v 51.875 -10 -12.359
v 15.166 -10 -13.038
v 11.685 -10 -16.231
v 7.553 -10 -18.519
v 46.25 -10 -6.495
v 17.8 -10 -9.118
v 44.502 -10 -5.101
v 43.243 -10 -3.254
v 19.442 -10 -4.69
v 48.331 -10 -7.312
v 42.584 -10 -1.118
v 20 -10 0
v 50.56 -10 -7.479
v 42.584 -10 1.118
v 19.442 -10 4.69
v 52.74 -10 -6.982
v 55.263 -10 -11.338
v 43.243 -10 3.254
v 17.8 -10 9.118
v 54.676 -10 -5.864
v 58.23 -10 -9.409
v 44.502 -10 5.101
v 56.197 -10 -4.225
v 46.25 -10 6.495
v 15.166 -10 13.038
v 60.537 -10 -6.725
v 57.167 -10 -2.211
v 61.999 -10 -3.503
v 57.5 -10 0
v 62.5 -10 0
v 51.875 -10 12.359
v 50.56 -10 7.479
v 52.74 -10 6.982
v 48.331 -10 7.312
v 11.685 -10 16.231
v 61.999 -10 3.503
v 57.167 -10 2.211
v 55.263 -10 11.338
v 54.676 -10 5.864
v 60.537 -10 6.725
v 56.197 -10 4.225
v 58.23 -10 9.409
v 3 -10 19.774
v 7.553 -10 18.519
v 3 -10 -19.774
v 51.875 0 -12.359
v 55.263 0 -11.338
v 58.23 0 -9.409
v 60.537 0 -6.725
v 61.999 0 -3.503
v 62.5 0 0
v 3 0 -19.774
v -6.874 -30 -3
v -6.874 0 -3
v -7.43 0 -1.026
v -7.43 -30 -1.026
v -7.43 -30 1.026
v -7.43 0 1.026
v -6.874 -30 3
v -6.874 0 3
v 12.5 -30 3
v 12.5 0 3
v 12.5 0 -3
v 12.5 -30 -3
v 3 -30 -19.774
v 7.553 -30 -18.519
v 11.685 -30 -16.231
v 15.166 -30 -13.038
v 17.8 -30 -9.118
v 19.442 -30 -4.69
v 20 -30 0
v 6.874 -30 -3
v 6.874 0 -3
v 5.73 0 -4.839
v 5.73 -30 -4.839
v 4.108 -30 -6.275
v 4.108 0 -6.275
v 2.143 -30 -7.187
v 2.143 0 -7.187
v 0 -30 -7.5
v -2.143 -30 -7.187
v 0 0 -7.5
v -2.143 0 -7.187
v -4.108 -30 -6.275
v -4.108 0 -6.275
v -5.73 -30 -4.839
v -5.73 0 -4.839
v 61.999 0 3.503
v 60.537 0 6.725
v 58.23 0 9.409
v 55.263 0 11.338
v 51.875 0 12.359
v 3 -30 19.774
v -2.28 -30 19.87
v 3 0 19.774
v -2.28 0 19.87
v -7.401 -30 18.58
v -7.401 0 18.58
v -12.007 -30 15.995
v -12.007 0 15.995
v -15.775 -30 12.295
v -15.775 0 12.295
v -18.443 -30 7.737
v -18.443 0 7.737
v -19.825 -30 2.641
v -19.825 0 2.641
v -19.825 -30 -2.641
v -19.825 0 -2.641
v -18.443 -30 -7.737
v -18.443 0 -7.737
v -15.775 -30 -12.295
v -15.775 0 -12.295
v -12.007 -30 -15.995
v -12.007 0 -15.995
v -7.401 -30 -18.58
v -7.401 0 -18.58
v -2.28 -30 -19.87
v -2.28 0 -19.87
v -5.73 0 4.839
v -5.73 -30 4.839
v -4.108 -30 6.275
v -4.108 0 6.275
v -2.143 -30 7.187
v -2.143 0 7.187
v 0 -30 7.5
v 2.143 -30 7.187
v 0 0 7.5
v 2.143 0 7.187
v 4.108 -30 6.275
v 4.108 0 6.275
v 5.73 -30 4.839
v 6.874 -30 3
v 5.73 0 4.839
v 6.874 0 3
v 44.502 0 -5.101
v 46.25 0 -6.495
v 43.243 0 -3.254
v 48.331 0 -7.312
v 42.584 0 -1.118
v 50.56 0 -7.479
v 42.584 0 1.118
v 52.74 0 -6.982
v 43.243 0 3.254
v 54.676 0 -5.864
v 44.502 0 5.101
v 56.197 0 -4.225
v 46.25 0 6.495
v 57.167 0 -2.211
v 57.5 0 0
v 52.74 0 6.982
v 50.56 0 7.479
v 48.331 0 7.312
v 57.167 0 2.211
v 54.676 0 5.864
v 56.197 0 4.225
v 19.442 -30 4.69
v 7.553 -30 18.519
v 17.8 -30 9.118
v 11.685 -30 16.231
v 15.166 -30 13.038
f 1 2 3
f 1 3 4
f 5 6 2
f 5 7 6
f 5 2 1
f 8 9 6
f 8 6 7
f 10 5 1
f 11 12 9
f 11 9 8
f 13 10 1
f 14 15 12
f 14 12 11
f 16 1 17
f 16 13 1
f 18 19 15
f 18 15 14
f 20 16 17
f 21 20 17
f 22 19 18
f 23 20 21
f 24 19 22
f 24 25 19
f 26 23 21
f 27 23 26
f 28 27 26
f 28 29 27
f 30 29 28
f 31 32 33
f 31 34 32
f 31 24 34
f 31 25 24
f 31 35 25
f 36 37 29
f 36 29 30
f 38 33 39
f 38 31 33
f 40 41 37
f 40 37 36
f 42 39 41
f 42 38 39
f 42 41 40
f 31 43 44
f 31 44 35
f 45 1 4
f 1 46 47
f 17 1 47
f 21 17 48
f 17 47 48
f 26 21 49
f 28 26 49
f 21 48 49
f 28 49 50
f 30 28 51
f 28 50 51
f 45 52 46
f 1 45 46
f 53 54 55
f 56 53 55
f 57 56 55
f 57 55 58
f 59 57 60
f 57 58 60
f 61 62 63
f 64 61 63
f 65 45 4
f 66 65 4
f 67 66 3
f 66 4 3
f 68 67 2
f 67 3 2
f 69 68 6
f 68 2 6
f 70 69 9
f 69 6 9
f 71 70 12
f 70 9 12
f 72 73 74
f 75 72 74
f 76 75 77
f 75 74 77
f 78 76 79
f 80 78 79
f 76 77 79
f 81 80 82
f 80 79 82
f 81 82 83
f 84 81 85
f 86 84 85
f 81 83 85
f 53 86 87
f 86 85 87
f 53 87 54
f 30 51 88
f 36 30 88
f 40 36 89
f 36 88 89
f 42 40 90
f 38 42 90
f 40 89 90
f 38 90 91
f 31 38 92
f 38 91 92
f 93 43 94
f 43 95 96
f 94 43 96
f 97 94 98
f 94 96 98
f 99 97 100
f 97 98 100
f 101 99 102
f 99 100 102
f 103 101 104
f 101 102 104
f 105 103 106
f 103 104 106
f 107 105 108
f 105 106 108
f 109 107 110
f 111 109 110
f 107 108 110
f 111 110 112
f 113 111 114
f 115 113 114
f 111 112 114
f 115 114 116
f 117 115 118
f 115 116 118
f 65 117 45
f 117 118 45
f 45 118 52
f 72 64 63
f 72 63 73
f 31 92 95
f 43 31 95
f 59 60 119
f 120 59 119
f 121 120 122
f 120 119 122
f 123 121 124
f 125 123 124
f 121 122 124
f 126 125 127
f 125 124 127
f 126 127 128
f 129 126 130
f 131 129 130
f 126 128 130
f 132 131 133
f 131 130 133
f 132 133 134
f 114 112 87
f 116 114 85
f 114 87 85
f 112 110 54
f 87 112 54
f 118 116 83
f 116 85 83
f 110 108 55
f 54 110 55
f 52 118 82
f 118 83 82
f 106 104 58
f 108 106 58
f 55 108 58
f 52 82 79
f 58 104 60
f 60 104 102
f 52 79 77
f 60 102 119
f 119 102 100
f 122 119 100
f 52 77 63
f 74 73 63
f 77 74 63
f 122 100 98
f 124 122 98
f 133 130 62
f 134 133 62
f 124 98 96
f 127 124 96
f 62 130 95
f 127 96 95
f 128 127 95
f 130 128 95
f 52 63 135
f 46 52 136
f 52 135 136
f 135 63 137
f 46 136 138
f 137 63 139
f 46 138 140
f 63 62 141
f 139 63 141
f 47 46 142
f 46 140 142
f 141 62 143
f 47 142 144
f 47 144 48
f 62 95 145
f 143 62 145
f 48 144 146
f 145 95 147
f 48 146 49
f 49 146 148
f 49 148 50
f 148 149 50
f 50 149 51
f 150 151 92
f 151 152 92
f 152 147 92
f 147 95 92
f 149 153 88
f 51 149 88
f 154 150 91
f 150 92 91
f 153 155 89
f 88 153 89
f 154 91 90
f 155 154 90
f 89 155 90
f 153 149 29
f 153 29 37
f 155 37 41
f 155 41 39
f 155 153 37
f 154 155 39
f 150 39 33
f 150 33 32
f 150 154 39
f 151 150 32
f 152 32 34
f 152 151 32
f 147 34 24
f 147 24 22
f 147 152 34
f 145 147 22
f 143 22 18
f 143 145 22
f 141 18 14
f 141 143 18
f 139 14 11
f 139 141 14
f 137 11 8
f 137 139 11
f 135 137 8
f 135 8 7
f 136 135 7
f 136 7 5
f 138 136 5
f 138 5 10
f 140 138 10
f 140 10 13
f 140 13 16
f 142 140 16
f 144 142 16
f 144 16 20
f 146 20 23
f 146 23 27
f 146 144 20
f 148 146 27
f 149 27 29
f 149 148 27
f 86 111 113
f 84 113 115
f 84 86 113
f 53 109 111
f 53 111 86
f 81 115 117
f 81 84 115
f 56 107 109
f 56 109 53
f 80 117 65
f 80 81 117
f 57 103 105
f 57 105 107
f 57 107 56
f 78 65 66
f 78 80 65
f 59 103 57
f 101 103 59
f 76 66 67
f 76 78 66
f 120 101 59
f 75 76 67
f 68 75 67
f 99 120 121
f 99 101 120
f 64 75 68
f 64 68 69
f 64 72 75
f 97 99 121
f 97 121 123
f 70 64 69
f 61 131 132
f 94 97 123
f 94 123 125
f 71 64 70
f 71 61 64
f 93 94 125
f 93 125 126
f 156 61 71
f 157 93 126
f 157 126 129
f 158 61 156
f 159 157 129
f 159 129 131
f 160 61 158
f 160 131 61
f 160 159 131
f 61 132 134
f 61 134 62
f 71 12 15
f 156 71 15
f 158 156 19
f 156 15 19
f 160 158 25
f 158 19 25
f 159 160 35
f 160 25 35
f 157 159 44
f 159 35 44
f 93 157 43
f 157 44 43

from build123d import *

# Parameters (mm, degrees)
F0_R     = 7.5
F1_DEPTH = 10
F2_DEPTH = 30


with BuildPart() as f1:
    # F0 (on Front) → F1 (new body)
    with BuildSketch(Plane.XZ):
        with BuildLine():
            ThreePointArc((3, -19.77372), (15.165751, -13.038405), (20, 0))
            ThreePointArc((20, 0), (15.165751, 13.038405), (3, 19.77372))
            ThreePointArc((3, 19.77372), (-20, 0), (3, -19.77372))
        make_face()
        with BuildLine():
            Line((12.5, 3), (12.5, -3))
            Line((12.5, -3), (6.873864, -3))
            ThreePointArc((6.873864, -3), (0, -7.5), (-6.873864, -3))
            Line((-6.873864, -3), (-12.5, -3))
            Line((-12.5, -3), (-12.5, 3))
            Line((-12.5, 3), (-6.873864, 3))
            ThreePointArc((-6.873864, 3), (0, 7.5), (6.873864, 3))
            Line((6.873864, 3), (12.5, 3))
        make_face(mode=Mode.SUBTRACT)
        with BuildLine():
            ThreePointArc((3, 19.77372), (15.165751, 13.038405), (20, 0))
            ThreePointArc((20, 0), (15.165751, -13.038405), (3, -19.77372))
            Line((3, -19.77372), (51.875, -12.358575))
            ThreePointArc((51.875, -12.358575), (37.5, 0), (51.875, 12.358575))
            Line((51.875, 12.358575), (3, 19.77372))
        make_face()
        with BuildLine():
            ThreePointArc((62.5, 0), (59.478594, 8.149003), (51.875, 12.358575))
            ThreePointArc((51.875, 12.358575), (37.5, 0), (51.875, -12.358575))
            ThreePointArc((51.875, -12.358575), (59.478594, -8.149003), (62.5, 0))
        make_face()
        with Locations((50, 0)):
            Circle(F0_R, mode=Mode.SUBTRACT)
        with BuildLine():
            Line((-12.5, -3), (-6.873864, -3))
            ThreePointArc((-6.873864, -3), (-7.5, 0), (-6.873864, 3))
            Line((-6.873864, 3), (-12.5, 3))
            Line((-12.5, 3), (-12.5, -3))
        make_face()
    extrude(amount=F1_DEPTH)

    # F0 (on Front) → F2 (join)
    with BuildSketch(Plane.XZ):
        with BuildLine():
            ThreePointArc((3, -19.77372), (15.165751, -13.038405), (20, 0))
            ThreePointArc((20, 0), (15.165751, 13.038405), (3, 19.77372))
            ThreePointArc((3, 19.77372), (-20, 0), (3, -19.77372))
        make_face()
        with BuildLine():
            Line((12.5, 3), (12.5, -3))
            Line((12.5, -3), (6.873864, -3))
            ThreePointArc((6.873864, -3), (0, -7.5), (-6.873864, -3))
            Line((-6.873864, -3), (-12.5, -3))
            Line((-12.5, -3), (-12.5, 3))
            Line((-12.5, 3), (-6.873864, 3))
            ThreePointArc((-6.873864, 3), (0, 7.5), (6.873864, 3))
            Line((6.873864, 3), (12.5, 3))
        make_face(mode=Mode.SUBTRACT)
        with BuildLine():
            Line((-12.5, -3), (-6.873864, -3))
            ThreePointArc((-6.873864, -3), (-7.5, 0), (-6.873864, 3))
            Line((-6.873864, 3), (-12.5, 3))
            Line((-12.5, 3), (-12.5, -3))
        make_face()
    extrude(amount=F2_DEPTH)


solid = f1.part
